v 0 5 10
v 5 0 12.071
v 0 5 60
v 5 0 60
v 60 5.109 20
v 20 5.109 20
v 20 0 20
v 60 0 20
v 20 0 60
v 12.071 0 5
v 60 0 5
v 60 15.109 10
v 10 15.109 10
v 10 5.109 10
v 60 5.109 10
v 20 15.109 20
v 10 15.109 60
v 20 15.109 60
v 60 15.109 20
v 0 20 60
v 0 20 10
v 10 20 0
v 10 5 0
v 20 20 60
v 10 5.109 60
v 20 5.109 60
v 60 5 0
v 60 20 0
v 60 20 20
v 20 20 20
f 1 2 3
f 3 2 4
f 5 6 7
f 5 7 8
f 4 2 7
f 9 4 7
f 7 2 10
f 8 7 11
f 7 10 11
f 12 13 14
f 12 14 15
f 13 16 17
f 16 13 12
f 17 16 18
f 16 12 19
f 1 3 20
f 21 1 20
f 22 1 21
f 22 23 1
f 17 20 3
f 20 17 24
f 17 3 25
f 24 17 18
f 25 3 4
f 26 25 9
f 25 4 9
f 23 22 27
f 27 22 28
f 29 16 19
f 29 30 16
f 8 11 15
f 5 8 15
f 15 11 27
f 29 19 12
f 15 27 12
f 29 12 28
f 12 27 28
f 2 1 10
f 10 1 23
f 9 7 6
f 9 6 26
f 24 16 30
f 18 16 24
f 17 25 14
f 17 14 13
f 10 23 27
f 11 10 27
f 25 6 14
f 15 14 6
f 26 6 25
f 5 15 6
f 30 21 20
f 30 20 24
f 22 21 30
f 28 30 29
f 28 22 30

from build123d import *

# Parameters (mm, degrees)
F0_W     = 60
F0_H     = 20
F1_DEPTH = 20
F2_W     = 20
F2_H     = 60
F3_DEPTH = 20
F4_W     = 10
F4_H     = 40
F5_DEPTH = 10
F7_DEPTH = 10
F8_SIZE  = 10
F9_SIZE  = 5
F10_SIZE = 5


with BuildPart() as f1:
    # F0 (on Top) → F1 (new body)
    with BuildSketch(Plane.XY):
        with Locations((30, 10)):
            Rectangle(F0_W, F0_H)
    extrude(amount=F1_DEPTH)

    # F2 (on Front) → F3 (join)
    with BuildSketch(Plane.XZ):
        with Locations((10, 30)):
            Rectangle(F2_W, F2_H)
    extrude(amount=-F3_DEPTH)

    # F4 (on face) → F5 (cut)
    with BuildSketch(Plane.YZ.offset(20)):
        with Locations((10.1094414666, 40)):
            Rectangle(F4_W, F4_H)
    extrude(amount=-F5_DEPTH, mode=Mode.SUBTRACT)

    # F6 (on face) → F7 (cut)
    with BuildSketch(Plane.XY.offset(20)):
        Polygon((20, 15.1094414666), (10, 15.1094414666), (10, 5.1094414666), (20, 5.1094414666), (60, 5.1094414666), (60, 15.1094414666), align=None)
    extrude(amount=-F7_DEPTH, mode=Mode.SUBTRACT)

    # F8
    f8_edges = [f1.edges().sort_by_distance(p)[0] for p in [
        (0, 10, 0),
    ]]
    chamfer(f8_edges, length=F8_SIZE)

    # F9
    f9_edges = [f1.edges().sort_by_distance(p)[0] for p in [
        (35, 0, 0),
        (5, 0, 5),
    ]]
    chamfer(f9_edges, length=F9_SIZE)

    # F10
    f10_edges = [f1.edges().sort_by_distance(p)[0] for p in [
        (0, 0, 38.535534),
    ]]
    chamfer(f10_edges, length=F10_SIZE)


solid = f1.part
